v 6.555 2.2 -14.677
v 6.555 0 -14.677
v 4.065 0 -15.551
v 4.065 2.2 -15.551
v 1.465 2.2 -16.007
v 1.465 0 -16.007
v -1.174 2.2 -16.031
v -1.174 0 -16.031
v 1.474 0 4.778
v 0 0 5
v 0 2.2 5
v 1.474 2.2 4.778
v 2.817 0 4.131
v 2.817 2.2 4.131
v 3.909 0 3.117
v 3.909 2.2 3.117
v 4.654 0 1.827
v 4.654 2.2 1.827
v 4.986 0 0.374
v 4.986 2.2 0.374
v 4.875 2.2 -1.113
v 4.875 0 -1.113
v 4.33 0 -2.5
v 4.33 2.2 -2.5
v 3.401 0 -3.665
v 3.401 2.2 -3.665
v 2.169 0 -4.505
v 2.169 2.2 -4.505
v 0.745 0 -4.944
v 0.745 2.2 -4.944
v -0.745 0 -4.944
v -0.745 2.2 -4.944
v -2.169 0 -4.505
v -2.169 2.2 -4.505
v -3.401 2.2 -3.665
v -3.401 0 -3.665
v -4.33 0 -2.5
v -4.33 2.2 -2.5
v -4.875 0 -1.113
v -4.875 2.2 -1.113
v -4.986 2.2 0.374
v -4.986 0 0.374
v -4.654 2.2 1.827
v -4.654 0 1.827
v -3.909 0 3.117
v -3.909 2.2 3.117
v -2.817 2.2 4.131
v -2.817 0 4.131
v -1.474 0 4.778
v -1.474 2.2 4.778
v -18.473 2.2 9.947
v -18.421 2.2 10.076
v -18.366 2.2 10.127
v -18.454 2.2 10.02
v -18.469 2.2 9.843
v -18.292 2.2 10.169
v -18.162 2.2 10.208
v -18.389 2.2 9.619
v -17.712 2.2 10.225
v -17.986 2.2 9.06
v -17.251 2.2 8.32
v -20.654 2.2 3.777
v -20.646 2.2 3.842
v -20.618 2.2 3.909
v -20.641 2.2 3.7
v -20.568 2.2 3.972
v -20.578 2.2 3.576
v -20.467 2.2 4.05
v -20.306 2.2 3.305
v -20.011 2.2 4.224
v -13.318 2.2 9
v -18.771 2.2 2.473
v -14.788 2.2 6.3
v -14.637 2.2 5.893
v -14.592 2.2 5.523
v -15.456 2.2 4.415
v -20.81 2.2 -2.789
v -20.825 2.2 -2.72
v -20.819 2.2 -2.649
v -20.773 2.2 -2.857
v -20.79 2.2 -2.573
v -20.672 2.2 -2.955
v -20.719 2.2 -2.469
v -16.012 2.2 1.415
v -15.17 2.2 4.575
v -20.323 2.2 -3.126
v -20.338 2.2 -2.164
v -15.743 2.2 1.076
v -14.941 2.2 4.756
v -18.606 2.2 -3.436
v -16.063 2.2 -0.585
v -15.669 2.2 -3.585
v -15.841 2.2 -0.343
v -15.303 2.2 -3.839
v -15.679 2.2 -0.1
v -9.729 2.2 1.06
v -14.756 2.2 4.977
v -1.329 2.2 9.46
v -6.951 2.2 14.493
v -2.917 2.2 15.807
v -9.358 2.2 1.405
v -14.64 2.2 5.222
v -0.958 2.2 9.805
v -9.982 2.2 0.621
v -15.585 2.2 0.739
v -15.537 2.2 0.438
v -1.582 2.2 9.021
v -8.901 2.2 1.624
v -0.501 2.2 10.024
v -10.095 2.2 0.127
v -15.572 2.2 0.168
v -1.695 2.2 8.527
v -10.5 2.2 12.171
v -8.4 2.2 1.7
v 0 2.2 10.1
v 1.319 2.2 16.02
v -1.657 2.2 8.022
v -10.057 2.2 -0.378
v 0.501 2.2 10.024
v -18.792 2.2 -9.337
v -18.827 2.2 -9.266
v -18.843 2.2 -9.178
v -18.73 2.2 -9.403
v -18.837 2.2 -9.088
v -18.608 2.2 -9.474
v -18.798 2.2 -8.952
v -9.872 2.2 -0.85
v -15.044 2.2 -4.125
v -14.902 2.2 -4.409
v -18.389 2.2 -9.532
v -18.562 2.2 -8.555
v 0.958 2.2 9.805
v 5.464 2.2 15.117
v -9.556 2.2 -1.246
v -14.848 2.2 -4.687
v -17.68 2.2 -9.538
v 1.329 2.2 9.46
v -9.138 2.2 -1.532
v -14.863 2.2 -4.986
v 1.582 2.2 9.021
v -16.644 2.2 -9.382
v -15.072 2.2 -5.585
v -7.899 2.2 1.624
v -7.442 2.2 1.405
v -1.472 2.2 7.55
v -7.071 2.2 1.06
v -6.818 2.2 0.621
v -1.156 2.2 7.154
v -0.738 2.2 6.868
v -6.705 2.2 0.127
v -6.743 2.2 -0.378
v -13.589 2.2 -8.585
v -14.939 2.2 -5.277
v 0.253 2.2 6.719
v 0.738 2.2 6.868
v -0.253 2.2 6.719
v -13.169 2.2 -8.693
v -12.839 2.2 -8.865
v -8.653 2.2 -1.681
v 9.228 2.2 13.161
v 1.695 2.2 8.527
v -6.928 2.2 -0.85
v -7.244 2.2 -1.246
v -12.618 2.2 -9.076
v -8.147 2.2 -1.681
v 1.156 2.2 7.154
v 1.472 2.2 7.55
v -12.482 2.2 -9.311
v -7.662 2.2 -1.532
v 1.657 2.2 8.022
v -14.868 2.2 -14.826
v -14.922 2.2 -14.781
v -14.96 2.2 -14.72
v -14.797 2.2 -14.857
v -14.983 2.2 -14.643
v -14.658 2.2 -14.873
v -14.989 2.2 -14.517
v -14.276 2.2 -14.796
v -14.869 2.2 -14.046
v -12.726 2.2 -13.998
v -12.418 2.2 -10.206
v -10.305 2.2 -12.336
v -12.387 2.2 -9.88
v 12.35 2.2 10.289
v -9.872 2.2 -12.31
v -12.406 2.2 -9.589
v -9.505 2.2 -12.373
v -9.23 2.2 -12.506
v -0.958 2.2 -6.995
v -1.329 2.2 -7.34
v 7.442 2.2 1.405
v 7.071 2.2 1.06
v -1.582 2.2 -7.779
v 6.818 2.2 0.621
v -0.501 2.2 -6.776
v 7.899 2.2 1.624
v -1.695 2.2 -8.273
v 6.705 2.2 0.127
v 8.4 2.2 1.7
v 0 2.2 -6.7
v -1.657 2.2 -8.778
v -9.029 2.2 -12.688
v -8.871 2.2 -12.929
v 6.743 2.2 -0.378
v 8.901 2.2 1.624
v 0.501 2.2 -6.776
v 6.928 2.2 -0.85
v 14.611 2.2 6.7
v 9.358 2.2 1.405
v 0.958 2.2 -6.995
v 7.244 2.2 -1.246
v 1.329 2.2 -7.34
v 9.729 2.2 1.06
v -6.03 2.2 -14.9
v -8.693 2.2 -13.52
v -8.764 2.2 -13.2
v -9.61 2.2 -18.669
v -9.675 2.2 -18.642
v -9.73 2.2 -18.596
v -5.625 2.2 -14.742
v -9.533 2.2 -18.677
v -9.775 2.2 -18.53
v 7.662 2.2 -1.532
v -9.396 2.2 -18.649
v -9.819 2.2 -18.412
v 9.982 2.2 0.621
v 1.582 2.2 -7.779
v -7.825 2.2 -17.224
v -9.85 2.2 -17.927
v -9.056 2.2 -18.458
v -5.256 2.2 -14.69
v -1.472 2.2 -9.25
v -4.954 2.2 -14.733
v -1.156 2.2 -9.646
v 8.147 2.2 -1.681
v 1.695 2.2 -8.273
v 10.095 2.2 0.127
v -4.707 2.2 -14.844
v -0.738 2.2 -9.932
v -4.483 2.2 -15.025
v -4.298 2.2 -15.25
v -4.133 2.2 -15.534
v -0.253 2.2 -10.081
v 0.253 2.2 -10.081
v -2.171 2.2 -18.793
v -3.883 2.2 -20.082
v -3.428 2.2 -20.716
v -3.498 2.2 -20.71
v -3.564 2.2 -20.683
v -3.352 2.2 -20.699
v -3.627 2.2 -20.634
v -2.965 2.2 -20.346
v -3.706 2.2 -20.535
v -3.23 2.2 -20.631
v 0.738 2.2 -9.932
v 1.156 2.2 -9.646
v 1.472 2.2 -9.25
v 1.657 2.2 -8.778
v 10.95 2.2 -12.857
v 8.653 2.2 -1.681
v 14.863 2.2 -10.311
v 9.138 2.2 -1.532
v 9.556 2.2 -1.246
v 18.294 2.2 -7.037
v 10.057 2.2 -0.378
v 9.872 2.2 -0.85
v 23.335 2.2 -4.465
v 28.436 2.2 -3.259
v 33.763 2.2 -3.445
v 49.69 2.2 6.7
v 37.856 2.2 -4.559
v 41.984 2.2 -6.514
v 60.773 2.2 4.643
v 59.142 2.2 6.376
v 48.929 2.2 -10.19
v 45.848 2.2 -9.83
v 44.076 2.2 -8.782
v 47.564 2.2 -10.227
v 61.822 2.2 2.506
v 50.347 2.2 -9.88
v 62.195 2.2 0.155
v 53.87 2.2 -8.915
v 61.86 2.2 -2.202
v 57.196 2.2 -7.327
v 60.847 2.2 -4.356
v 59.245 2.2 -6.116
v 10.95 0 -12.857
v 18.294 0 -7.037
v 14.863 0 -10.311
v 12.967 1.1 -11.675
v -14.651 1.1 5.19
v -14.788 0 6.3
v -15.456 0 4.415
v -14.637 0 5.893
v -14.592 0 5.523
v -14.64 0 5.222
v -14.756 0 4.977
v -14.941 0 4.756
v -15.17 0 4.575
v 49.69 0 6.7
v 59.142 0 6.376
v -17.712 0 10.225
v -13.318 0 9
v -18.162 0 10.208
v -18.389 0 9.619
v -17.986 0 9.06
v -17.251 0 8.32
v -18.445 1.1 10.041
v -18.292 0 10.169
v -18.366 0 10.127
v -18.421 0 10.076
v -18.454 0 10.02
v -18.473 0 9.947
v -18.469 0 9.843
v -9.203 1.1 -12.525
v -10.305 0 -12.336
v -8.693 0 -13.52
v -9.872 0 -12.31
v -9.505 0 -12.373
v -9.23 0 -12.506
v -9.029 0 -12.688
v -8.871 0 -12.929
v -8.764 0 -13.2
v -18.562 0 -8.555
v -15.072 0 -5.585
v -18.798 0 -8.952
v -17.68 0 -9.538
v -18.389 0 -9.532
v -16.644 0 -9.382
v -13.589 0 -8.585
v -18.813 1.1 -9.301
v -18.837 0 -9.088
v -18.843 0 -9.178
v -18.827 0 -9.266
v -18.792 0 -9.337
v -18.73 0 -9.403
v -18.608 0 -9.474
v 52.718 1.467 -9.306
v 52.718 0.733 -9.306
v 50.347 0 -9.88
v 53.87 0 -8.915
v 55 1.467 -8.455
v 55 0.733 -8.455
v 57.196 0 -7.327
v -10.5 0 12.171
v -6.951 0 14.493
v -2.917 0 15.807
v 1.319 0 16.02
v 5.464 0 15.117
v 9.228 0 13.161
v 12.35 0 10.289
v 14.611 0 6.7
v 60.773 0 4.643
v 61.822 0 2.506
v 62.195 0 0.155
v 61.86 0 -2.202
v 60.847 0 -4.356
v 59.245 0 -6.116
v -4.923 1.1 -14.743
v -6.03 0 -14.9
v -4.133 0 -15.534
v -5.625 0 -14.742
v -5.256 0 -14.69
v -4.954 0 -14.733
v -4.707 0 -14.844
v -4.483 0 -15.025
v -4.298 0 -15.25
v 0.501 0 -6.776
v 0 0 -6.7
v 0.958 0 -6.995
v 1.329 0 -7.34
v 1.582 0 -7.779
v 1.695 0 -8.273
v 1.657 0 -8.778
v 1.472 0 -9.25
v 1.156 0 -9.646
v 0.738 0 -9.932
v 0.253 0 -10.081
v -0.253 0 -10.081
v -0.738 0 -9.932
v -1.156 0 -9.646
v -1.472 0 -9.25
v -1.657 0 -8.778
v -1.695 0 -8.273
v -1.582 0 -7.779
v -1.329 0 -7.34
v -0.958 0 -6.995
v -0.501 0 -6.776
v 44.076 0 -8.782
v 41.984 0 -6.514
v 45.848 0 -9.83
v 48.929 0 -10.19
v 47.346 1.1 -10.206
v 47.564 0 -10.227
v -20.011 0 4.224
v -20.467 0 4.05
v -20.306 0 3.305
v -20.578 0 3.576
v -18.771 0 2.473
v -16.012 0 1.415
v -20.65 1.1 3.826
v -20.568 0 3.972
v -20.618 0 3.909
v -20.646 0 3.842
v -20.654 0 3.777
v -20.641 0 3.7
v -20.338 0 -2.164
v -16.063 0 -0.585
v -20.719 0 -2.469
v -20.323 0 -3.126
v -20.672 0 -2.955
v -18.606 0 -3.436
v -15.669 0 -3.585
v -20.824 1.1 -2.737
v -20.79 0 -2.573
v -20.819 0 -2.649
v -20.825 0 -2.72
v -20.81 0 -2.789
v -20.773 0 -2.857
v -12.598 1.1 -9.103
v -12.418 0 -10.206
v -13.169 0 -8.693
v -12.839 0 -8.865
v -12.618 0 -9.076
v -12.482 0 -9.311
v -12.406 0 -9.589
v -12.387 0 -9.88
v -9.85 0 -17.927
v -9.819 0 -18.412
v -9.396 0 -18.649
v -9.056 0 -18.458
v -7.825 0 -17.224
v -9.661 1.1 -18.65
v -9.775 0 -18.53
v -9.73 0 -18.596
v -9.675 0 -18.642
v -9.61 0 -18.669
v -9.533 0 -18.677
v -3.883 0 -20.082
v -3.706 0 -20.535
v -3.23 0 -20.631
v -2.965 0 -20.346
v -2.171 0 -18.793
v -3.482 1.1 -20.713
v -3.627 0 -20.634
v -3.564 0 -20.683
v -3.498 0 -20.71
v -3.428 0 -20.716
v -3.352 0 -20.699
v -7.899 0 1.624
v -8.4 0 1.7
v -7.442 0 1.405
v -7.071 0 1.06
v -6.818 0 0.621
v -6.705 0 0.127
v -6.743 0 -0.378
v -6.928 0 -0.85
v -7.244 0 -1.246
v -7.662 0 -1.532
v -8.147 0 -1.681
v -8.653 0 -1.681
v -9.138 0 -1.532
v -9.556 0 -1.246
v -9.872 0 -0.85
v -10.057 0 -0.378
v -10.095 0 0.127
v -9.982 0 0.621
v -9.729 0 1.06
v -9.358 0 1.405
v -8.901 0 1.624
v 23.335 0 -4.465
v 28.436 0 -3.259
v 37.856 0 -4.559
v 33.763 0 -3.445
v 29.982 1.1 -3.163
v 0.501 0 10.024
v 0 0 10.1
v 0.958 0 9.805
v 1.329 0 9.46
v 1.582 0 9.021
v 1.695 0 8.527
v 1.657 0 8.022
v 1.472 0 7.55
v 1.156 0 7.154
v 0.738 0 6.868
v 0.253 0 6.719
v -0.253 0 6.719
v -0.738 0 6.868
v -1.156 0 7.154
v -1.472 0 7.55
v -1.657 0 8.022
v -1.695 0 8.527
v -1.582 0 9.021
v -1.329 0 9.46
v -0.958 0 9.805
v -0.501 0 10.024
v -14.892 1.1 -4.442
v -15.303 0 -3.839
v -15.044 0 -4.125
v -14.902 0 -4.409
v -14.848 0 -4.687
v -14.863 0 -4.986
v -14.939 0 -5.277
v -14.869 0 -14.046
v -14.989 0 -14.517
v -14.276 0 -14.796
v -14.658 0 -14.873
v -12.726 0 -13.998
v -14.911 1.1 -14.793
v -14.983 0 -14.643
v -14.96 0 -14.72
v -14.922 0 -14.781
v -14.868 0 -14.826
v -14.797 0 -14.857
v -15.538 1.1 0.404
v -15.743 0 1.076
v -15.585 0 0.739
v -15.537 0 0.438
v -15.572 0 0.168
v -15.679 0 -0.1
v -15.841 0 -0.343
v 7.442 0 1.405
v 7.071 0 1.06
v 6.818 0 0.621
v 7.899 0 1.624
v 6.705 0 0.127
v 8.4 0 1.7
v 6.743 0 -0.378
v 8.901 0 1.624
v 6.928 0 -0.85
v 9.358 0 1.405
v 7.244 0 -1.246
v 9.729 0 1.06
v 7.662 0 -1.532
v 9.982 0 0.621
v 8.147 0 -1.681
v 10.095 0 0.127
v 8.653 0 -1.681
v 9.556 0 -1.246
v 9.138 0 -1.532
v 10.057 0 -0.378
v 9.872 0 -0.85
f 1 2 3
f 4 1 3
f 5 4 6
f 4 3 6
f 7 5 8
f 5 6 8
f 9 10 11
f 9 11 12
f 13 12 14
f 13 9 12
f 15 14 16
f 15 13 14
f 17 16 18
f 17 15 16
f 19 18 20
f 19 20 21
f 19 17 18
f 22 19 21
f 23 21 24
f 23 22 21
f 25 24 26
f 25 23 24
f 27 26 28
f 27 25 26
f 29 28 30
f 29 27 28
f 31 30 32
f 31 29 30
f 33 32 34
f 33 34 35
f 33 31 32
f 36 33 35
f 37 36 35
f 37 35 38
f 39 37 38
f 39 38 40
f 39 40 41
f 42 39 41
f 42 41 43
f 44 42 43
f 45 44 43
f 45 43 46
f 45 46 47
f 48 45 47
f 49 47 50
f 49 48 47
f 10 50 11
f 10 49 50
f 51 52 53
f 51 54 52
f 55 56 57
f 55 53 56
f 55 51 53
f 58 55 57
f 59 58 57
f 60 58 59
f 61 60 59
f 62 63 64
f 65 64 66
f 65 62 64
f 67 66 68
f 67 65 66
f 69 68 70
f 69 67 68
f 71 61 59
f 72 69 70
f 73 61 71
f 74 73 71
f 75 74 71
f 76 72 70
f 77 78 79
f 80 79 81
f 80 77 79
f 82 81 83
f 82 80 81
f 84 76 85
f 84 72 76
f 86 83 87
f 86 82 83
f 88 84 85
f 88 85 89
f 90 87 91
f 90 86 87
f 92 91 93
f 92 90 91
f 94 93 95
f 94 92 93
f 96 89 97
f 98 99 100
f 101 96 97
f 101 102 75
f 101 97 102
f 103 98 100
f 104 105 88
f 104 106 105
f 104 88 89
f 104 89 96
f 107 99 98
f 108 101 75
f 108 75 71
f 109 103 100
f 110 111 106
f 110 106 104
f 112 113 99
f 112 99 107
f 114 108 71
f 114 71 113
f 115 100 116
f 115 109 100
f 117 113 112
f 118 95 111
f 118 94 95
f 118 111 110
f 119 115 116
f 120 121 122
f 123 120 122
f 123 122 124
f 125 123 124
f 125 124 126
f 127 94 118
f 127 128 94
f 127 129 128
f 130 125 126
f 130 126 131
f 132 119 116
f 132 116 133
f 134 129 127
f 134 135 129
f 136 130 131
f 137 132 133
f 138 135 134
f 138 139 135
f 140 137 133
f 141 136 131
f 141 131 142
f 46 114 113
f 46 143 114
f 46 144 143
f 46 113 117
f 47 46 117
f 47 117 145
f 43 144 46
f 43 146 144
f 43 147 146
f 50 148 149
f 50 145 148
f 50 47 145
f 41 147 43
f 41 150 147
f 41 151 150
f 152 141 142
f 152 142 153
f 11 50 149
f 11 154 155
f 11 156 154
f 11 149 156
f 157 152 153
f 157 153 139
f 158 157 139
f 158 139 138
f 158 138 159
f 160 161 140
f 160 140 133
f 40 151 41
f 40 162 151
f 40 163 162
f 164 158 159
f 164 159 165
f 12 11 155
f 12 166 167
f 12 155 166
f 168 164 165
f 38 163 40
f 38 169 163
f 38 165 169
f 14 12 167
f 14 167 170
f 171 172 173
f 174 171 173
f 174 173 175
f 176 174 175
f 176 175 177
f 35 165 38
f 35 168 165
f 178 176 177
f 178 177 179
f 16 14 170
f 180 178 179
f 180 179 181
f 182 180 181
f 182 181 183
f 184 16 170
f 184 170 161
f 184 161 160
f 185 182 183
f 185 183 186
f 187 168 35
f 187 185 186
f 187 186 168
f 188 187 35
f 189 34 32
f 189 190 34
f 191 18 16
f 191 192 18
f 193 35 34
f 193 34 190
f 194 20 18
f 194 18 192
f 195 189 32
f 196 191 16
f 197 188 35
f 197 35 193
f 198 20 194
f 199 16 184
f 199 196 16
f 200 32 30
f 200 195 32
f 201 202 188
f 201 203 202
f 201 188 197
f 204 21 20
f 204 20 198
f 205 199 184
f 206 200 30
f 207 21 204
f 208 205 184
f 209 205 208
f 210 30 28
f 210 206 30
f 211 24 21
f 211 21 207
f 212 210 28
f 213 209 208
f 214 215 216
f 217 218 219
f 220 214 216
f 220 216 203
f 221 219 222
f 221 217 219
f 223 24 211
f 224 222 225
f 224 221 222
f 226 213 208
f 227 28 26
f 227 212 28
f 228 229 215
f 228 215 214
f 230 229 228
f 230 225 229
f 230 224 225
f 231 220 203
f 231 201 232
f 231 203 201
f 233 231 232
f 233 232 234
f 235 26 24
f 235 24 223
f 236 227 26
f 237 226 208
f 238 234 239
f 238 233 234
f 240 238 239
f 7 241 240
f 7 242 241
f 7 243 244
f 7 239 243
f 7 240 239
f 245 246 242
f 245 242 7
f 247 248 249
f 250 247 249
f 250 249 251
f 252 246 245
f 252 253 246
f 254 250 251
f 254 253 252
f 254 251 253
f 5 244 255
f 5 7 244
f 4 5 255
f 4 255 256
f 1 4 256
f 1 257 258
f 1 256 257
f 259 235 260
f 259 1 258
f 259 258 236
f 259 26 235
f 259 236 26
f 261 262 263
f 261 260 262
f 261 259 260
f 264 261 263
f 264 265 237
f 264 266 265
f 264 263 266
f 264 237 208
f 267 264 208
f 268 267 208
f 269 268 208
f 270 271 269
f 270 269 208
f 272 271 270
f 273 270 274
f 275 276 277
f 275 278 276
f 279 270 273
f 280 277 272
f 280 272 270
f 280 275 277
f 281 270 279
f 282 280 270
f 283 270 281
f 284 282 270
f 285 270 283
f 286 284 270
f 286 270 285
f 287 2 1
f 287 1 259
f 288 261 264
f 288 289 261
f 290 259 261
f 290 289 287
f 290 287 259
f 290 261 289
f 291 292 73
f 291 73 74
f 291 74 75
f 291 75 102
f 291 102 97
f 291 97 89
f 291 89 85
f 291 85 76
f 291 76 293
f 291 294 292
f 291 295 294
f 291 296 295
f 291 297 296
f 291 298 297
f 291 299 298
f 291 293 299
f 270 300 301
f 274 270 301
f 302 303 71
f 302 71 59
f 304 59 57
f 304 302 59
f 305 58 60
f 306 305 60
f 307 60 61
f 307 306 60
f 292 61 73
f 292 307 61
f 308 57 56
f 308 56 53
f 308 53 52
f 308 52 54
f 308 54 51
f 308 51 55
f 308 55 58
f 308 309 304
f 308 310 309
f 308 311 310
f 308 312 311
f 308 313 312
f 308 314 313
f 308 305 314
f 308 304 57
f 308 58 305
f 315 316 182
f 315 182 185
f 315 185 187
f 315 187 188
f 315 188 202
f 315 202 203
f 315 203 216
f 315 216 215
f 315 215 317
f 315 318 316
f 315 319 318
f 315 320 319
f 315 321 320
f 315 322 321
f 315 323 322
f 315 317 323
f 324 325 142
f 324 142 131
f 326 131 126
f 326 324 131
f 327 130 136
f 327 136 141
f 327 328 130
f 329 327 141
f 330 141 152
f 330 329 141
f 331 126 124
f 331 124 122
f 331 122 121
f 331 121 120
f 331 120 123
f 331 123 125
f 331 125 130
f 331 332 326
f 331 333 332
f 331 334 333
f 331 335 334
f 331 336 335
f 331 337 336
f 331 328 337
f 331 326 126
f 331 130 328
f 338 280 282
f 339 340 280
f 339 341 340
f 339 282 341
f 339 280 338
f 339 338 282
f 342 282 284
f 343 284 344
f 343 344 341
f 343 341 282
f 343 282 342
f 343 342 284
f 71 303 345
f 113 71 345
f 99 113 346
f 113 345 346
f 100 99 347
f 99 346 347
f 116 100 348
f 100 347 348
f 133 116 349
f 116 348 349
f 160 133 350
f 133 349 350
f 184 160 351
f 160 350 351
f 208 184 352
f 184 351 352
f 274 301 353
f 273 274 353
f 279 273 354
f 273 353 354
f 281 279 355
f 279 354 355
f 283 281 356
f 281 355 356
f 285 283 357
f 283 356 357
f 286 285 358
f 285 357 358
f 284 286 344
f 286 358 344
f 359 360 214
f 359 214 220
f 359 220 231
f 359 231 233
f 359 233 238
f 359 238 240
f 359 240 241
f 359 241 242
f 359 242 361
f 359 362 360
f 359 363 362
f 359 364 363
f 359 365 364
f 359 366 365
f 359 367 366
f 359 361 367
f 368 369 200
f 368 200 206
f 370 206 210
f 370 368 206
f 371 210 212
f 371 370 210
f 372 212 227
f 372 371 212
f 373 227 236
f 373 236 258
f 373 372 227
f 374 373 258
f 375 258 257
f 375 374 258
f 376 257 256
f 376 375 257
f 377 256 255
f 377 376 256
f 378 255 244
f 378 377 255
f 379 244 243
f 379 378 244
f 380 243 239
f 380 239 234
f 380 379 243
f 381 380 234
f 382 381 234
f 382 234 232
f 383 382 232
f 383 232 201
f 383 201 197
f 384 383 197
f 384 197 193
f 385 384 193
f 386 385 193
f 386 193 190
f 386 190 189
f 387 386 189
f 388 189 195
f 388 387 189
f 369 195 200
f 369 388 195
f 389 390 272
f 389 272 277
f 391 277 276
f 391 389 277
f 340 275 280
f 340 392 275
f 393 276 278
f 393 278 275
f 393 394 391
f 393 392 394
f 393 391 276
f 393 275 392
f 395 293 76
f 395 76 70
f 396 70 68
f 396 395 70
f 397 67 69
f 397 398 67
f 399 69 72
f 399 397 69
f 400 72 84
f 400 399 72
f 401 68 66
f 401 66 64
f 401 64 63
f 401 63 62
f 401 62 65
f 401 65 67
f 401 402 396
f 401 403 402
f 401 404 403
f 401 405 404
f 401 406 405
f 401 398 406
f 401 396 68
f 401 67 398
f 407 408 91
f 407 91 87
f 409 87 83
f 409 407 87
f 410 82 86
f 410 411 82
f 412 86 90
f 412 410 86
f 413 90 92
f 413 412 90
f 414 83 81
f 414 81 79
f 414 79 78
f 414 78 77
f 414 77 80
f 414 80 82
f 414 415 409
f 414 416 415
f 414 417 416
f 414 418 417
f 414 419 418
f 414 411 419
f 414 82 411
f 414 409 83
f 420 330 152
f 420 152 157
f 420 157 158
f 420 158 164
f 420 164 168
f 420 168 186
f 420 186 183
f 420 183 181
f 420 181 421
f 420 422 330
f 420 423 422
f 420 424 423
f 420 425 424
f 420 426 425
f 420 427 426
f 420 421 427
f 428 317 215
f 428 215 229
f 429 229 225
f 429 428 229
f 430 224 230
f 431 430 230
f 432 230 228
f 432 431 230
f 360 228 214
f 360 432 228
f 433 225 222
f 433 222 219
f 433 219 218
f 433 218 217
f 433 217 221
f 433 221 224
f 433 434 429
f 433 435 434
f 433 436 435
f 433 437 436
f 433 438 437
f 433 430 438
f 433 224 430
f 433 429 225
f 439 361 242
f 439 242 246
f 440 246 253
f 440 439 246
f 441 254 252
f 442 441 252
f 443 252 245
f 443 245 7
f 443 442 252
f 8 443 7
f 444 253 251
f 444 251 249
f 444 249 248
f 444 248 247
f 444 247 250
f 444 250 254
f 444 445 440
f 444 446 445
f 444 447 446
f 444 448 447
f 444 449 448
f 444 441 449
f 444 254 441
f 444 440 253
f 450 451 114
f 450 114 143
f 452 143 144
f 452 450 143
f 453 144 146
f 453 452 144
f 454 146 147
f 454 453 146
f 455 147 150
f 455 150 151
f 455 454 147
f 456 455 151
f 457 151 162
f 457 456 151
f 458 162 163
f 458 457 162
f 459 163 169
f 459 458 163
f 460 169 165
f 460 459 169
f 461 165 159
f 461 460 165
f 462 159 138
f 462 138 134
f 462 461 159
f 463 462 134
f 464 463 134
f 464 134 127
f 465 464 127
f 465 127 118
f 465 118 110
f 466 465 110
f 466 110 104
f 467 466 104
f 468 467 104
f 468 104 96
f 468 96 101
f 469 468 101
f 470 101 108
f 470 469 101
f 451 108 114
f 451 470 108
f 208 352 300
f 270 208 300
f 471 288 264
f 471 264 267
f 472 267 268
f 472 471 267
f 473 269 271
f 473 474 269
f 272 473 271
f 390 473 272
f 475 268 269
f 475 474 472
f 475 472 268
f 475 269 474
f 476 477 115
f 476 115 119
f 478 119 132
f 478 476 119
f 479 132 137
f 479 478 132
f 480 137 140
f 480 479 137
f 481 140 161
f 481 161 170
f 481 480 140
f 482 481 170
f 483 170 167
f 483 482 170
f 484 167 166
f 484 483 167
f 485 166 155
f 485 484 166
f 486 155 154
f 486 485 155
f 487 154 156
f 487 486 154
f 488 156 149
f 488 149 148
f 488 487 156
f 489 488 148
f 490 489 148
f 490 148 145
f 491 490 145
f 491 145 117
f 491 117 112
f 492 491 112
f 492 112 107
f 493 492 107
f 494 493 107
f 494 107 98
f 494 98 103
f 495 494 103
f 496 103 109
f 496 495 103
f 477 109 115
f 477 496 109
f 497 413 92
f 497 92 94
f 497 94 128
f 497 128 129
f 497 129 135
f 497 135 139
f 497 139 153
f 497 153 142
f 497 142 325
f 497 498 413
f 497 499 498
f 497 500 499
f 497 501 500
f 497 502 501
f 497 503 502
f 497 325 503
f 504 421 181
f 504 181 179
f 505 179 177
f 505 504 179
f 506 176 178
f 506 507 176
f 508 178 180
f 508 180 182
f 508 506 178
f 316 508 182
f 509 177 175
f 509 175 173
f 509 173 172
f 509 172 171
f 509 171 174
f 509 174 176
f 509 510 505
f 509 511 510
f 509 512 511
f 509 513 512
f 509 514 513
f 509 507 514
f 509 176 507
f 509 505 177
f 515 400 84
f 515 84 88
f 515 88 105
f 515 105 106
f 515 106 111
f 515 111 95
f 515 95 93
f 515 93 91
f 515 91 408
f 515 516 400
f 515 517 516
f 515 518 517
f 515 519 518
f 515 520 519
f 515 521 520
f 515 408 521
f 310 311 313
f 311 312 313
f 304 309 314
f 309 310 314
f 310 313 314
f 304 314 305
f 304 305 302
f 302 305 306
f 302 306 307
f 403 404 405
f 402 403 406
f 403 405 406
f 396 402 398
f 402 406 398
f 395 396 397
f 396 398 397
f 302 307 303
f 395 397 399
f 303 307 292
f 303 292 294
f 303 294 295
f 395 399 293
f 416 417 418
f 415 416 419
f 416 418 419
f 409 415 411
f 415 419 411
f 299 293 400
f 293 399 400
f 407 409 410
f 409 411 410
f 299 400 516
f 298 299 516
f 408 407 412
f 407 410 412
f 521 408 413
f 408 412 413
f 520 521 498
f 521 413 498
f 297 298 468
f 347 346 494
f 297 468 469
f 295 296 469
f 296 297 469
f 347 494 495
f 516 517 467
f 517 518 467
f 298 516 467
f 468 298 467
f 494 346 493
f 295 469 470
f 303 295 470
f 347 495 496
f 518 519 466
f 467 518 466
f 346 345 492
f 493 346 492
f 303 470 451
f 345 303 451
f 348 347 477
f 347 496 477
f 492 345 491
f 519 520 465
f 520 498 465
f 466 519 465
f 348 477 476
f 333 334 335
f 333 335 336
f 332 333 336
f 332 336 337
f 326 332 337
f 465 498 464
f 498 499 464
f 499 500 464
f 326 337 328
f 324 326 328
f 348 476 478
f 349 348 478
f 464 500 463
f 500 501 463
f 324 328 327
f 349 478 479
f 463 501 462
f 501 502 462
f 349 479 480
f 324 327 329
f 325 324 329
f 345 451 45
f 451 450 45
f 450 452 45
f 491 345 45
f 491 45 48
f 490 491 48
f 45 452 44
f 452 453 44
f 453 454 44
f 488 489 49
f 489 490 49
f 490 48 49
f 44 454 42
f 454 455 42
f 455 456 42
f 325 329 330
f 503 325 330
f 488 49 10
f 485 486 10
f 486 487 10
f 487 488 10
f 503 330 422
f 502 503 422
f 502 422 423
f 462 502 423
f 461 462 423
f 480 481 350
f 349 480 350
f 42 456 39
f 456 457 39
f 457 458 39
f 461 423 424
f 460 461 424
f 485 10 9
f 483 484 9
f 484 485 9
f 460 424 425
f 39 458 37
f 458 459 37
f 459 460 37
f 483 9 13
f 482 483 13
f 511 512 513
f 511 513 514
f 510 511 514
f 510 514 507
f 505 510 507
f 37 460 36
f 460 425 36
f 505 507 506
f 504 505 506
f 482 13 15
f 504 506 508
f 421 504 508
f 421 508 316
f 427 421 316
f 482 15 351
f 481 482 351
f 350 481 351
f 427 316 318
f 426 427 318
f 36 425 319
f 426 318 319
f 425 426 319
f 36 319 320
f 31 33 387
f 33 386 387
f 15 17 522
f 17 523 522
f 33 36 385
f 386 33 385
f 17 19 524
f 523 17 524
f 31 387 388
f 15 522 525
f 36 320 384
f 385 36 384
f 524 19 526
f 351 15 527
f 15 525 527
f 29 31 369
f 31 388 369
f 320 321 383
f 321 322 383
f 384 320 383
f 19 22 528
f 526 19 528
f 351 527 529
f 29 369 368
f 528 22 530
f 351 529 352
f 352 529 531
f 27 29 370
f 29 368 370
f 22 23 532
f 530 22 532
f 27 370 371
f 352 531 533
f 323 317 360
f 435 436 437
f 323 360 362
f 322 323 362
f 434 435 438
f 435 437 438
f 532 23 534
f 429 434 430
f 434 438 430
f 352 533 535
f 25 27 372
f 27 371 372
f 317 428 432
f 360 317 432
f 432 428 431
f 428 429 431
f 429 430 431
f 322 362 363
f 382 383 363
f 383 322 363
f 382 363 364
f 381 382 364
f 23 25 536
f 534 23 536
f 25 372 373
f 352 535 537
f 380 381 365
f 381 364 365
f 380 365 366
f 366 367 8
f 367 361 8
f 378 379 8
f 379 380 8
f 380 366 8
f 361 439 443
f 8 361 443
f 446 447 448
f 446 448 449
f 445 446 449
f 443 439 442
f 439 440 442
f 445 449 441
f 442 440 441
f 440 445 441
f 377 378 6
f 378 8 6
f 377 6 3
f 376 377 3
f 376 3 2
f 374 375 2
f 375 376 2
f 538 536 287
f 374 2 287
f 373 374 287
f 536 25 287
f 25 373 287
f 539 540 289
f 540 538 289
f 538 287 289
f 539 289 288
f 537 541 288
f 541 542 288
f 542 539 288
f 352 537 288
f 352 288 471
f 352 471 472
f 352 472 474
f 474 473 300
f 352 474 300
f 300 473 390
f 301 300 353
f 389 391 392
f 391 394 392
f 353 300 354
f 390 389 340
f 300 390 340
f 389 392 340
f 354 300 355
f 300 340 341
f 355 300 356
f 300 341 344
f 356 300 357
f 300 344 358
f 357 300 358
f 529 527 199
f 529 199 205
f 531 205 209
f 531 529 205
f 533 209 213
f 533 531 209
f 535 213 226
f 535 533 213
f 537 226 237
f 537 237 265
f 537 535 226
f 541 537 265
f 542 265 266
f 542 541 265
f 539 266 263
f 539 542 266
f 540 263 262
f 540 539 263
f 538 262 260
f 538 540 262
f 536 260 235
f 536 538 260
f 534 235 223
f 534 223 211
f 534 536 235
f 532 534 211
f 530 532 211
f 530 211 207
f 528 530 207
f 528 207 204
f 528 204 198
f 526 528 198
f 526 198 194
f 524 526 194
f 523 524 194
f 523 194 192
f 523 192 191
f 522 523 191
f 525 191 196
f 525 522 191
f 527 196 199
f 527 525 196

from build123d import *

# Parameters (mm, degrees)
SKETCH_1_R      = 5
SKETCH_1_R_2    = 1.7
EXTRUDE_1_DEPTH = 2.2


with BuildPart() as part:
    # 草图1 → 凸台-拉伸1 (new body)
    with BuildSketch(Plane(origin=(0, 0, 0), x_dir=(1, 0, 0), z_dir=(0, 1, 0))):
        with BuildLine():
            Line((14.611038219, -6.7), (49.690443214, -6.7))
            Line((49.690443214, -6.7), (59.14213471, -6.376451123))
            ThreePointArc((59.14213471, -6.376451123), (62.116009682, 1.036036266), (57.195522798, 7.327118086))
            add(Edge.make_bspline(
                [(50.347107534, 9.880159683), (52.761361064, 9.443859829), (55.044166152, 8.592845964), (57.195522798, 7.327118086)],
                knots=[0.288436631, 0.288436631, 0.288436631, 0.288436631, 1, 1, 1, 1], degree=3))
            add(Edge.make_bspline(
                [(41.984360593, 6.514151987), (43.667045792, 8.848960271), (46.317081673, 10.55679372), (49.303704664, 10.196073302), (50.347107534, 9.880159683)],
                knots=[0.090085046, 0.090085046, 0.090085046, 0.090085046, 0.520368733, 0.736118782, 0.736118782, 0.736118782, 0.736118782], degree=3))
            add(Edge.make_bspline(
                [(18.29395406, 7.037125327), (29.823970963, -0.449921726), (41.984360593, 6.514151987)],
                knots=[0, 0, 0, 1, 1, 1], degree=2))
            add(Edge.make_bspline(
                [(6.555128163, 14.676604942), (13.508953417, 12.492816522), (18.29395406, 7.037125327)],
                knots=[0, 0, 0, 1, 1, 1], degree=2))
            ThreePointArc((6.555128163, 14.676604942), (2.774471684, 15.832711225), (-1.174023286, 16.031035749))
            add(Edge.make_bspline(
                [(-4.132506817, 15.533667476), (-4.311159294, 25.643963381), (-1.174023286, 16.031035749)],
                knots=[0, 0, 0, 1, 1, 1], degree=2))
            add(Edge.make_bspline(
                [(-6.029547406, 14.900234761), (-4.764310754, 14.268430824), (-4.132506817, 15.533667476)],
                knots=[0, 0, 0, 1, 1, 1], degree=2))
            add(Edge.make_bspline(
                [(-8.69333509, 13.520294481), (-11.961242179, 23.089556901), (-6.029547406, 14.900234761)],
                knots=[0, 0, 0, 1, 1, 1], degree=2))
            add(Edge.make_bspline(
                [(-10.305043141, 12.336065974), (-8.907074862, 12.122326202), (-8.69333509, 13.520294481)],
                knots=[0, 0, 0, 1, 1, 1], degree=2))
            add(Edge.make_bspline(
                [(-12.417884822, 10.206300721), (-18.460681491, 18.31398895), (-10.305043141, 12.336065974)],
                knots=[0, 0, 0, 1, 1, 1], degree=2))
            add(Edge.make_bspline(
                [(-13.589217783, 8.585196439), (-12.192999161, 8.810082099), (-12.417884822, 10.206300721)],
                knots=[0, 0, 0, 1, 1, 1], degree=2))
            add(Edge.make_bspline(
                [(-15.07242577, 5.585196439), (-23.295073991, 11.517146599), (-13.589217783, 8.585196439)],
                knots=[0, 0, 0, 1, 1, 1], degree=2))
            add(Edge.make_bspline(
                [(-15.669039675, 3.585196439), (-14.412461062, 4.29933734), (-15.07242577, 5.585196439)],
                knots=[0, 0, 0, 1, 1, 1], degree=2))
            add(Edge.make_bspline(
                [(-16.063311706, 0.585196439), (-25.780917218, 3.388231532), (-15.669039675, 3.585196439)],
                knots=[0, 0, 0, 1, 1, 1], degree=2))
            add(Edge.make_bspline(
                [(-16.011582331, -1.414803561), (-15.037875075, -0.394118455), (-16.063311706, 0.585196439)],
                knots=[0, 0, 0, 1, 1, 1], degree=2))
            add(Edge.make_bspline(
                [(-15.455806267, -4.414803561), (-25.566384923, -4.736394924), (-16.011582331, -1.414803561)],
                knots=[0, 0, 0, 1, 1, 1], degree=2))
            add(Edge.make_bspline(
                [(-14.787919584, -6.299989859), (-14.179269776, -5.023453369), (-15.455806267, -4.414803561)],
                knots=[0, 0, 0, 1, 1, 1], degree=2))
            add(Edge.make_bspline(
                [(-13.318124412, -9), (-22.835991784, -12.431149783), (-14.787919584, -6.299989859)],
                knots=[0, 0, 0, 1, 1, 1], degree=2))
            ThreePointArc((-13.318124412, -9), (1.319244681, -16.019738803), (14.611038219, -6.7))
        make_face()
        with Locations(Location((0, 0, 0), (0, 0, 270))):
            Circle(SKETCH_1_R, mode=Mode.SUBTRACT)
        with Locations(Location((0, 8.4, 0), (0, 0, 270))):
            Circle(SKETCH_1_R_2, mode=Mode.SUBTRACT)
        with Locations(Location((8.4, 0, 0), (0, 0, 270))):
            Circle(SKETCH_1_R_2, mode=Mode.SUBTRACT)
        with Locations(Location((-8.4, 0, 0), (0, 0, 270))):
            Circle(SKETCH_1_R_2, mode=Mode.SUBTRACT)
        with Locations(Location((0, -8.4, 0), (0, 0, 270))):
            Circle(SKETCH_1_R_2, mode=Mode.SUBTRACT)
    extrude(amount=EXTRUDE_1_DEPTH)


solid = part.part
